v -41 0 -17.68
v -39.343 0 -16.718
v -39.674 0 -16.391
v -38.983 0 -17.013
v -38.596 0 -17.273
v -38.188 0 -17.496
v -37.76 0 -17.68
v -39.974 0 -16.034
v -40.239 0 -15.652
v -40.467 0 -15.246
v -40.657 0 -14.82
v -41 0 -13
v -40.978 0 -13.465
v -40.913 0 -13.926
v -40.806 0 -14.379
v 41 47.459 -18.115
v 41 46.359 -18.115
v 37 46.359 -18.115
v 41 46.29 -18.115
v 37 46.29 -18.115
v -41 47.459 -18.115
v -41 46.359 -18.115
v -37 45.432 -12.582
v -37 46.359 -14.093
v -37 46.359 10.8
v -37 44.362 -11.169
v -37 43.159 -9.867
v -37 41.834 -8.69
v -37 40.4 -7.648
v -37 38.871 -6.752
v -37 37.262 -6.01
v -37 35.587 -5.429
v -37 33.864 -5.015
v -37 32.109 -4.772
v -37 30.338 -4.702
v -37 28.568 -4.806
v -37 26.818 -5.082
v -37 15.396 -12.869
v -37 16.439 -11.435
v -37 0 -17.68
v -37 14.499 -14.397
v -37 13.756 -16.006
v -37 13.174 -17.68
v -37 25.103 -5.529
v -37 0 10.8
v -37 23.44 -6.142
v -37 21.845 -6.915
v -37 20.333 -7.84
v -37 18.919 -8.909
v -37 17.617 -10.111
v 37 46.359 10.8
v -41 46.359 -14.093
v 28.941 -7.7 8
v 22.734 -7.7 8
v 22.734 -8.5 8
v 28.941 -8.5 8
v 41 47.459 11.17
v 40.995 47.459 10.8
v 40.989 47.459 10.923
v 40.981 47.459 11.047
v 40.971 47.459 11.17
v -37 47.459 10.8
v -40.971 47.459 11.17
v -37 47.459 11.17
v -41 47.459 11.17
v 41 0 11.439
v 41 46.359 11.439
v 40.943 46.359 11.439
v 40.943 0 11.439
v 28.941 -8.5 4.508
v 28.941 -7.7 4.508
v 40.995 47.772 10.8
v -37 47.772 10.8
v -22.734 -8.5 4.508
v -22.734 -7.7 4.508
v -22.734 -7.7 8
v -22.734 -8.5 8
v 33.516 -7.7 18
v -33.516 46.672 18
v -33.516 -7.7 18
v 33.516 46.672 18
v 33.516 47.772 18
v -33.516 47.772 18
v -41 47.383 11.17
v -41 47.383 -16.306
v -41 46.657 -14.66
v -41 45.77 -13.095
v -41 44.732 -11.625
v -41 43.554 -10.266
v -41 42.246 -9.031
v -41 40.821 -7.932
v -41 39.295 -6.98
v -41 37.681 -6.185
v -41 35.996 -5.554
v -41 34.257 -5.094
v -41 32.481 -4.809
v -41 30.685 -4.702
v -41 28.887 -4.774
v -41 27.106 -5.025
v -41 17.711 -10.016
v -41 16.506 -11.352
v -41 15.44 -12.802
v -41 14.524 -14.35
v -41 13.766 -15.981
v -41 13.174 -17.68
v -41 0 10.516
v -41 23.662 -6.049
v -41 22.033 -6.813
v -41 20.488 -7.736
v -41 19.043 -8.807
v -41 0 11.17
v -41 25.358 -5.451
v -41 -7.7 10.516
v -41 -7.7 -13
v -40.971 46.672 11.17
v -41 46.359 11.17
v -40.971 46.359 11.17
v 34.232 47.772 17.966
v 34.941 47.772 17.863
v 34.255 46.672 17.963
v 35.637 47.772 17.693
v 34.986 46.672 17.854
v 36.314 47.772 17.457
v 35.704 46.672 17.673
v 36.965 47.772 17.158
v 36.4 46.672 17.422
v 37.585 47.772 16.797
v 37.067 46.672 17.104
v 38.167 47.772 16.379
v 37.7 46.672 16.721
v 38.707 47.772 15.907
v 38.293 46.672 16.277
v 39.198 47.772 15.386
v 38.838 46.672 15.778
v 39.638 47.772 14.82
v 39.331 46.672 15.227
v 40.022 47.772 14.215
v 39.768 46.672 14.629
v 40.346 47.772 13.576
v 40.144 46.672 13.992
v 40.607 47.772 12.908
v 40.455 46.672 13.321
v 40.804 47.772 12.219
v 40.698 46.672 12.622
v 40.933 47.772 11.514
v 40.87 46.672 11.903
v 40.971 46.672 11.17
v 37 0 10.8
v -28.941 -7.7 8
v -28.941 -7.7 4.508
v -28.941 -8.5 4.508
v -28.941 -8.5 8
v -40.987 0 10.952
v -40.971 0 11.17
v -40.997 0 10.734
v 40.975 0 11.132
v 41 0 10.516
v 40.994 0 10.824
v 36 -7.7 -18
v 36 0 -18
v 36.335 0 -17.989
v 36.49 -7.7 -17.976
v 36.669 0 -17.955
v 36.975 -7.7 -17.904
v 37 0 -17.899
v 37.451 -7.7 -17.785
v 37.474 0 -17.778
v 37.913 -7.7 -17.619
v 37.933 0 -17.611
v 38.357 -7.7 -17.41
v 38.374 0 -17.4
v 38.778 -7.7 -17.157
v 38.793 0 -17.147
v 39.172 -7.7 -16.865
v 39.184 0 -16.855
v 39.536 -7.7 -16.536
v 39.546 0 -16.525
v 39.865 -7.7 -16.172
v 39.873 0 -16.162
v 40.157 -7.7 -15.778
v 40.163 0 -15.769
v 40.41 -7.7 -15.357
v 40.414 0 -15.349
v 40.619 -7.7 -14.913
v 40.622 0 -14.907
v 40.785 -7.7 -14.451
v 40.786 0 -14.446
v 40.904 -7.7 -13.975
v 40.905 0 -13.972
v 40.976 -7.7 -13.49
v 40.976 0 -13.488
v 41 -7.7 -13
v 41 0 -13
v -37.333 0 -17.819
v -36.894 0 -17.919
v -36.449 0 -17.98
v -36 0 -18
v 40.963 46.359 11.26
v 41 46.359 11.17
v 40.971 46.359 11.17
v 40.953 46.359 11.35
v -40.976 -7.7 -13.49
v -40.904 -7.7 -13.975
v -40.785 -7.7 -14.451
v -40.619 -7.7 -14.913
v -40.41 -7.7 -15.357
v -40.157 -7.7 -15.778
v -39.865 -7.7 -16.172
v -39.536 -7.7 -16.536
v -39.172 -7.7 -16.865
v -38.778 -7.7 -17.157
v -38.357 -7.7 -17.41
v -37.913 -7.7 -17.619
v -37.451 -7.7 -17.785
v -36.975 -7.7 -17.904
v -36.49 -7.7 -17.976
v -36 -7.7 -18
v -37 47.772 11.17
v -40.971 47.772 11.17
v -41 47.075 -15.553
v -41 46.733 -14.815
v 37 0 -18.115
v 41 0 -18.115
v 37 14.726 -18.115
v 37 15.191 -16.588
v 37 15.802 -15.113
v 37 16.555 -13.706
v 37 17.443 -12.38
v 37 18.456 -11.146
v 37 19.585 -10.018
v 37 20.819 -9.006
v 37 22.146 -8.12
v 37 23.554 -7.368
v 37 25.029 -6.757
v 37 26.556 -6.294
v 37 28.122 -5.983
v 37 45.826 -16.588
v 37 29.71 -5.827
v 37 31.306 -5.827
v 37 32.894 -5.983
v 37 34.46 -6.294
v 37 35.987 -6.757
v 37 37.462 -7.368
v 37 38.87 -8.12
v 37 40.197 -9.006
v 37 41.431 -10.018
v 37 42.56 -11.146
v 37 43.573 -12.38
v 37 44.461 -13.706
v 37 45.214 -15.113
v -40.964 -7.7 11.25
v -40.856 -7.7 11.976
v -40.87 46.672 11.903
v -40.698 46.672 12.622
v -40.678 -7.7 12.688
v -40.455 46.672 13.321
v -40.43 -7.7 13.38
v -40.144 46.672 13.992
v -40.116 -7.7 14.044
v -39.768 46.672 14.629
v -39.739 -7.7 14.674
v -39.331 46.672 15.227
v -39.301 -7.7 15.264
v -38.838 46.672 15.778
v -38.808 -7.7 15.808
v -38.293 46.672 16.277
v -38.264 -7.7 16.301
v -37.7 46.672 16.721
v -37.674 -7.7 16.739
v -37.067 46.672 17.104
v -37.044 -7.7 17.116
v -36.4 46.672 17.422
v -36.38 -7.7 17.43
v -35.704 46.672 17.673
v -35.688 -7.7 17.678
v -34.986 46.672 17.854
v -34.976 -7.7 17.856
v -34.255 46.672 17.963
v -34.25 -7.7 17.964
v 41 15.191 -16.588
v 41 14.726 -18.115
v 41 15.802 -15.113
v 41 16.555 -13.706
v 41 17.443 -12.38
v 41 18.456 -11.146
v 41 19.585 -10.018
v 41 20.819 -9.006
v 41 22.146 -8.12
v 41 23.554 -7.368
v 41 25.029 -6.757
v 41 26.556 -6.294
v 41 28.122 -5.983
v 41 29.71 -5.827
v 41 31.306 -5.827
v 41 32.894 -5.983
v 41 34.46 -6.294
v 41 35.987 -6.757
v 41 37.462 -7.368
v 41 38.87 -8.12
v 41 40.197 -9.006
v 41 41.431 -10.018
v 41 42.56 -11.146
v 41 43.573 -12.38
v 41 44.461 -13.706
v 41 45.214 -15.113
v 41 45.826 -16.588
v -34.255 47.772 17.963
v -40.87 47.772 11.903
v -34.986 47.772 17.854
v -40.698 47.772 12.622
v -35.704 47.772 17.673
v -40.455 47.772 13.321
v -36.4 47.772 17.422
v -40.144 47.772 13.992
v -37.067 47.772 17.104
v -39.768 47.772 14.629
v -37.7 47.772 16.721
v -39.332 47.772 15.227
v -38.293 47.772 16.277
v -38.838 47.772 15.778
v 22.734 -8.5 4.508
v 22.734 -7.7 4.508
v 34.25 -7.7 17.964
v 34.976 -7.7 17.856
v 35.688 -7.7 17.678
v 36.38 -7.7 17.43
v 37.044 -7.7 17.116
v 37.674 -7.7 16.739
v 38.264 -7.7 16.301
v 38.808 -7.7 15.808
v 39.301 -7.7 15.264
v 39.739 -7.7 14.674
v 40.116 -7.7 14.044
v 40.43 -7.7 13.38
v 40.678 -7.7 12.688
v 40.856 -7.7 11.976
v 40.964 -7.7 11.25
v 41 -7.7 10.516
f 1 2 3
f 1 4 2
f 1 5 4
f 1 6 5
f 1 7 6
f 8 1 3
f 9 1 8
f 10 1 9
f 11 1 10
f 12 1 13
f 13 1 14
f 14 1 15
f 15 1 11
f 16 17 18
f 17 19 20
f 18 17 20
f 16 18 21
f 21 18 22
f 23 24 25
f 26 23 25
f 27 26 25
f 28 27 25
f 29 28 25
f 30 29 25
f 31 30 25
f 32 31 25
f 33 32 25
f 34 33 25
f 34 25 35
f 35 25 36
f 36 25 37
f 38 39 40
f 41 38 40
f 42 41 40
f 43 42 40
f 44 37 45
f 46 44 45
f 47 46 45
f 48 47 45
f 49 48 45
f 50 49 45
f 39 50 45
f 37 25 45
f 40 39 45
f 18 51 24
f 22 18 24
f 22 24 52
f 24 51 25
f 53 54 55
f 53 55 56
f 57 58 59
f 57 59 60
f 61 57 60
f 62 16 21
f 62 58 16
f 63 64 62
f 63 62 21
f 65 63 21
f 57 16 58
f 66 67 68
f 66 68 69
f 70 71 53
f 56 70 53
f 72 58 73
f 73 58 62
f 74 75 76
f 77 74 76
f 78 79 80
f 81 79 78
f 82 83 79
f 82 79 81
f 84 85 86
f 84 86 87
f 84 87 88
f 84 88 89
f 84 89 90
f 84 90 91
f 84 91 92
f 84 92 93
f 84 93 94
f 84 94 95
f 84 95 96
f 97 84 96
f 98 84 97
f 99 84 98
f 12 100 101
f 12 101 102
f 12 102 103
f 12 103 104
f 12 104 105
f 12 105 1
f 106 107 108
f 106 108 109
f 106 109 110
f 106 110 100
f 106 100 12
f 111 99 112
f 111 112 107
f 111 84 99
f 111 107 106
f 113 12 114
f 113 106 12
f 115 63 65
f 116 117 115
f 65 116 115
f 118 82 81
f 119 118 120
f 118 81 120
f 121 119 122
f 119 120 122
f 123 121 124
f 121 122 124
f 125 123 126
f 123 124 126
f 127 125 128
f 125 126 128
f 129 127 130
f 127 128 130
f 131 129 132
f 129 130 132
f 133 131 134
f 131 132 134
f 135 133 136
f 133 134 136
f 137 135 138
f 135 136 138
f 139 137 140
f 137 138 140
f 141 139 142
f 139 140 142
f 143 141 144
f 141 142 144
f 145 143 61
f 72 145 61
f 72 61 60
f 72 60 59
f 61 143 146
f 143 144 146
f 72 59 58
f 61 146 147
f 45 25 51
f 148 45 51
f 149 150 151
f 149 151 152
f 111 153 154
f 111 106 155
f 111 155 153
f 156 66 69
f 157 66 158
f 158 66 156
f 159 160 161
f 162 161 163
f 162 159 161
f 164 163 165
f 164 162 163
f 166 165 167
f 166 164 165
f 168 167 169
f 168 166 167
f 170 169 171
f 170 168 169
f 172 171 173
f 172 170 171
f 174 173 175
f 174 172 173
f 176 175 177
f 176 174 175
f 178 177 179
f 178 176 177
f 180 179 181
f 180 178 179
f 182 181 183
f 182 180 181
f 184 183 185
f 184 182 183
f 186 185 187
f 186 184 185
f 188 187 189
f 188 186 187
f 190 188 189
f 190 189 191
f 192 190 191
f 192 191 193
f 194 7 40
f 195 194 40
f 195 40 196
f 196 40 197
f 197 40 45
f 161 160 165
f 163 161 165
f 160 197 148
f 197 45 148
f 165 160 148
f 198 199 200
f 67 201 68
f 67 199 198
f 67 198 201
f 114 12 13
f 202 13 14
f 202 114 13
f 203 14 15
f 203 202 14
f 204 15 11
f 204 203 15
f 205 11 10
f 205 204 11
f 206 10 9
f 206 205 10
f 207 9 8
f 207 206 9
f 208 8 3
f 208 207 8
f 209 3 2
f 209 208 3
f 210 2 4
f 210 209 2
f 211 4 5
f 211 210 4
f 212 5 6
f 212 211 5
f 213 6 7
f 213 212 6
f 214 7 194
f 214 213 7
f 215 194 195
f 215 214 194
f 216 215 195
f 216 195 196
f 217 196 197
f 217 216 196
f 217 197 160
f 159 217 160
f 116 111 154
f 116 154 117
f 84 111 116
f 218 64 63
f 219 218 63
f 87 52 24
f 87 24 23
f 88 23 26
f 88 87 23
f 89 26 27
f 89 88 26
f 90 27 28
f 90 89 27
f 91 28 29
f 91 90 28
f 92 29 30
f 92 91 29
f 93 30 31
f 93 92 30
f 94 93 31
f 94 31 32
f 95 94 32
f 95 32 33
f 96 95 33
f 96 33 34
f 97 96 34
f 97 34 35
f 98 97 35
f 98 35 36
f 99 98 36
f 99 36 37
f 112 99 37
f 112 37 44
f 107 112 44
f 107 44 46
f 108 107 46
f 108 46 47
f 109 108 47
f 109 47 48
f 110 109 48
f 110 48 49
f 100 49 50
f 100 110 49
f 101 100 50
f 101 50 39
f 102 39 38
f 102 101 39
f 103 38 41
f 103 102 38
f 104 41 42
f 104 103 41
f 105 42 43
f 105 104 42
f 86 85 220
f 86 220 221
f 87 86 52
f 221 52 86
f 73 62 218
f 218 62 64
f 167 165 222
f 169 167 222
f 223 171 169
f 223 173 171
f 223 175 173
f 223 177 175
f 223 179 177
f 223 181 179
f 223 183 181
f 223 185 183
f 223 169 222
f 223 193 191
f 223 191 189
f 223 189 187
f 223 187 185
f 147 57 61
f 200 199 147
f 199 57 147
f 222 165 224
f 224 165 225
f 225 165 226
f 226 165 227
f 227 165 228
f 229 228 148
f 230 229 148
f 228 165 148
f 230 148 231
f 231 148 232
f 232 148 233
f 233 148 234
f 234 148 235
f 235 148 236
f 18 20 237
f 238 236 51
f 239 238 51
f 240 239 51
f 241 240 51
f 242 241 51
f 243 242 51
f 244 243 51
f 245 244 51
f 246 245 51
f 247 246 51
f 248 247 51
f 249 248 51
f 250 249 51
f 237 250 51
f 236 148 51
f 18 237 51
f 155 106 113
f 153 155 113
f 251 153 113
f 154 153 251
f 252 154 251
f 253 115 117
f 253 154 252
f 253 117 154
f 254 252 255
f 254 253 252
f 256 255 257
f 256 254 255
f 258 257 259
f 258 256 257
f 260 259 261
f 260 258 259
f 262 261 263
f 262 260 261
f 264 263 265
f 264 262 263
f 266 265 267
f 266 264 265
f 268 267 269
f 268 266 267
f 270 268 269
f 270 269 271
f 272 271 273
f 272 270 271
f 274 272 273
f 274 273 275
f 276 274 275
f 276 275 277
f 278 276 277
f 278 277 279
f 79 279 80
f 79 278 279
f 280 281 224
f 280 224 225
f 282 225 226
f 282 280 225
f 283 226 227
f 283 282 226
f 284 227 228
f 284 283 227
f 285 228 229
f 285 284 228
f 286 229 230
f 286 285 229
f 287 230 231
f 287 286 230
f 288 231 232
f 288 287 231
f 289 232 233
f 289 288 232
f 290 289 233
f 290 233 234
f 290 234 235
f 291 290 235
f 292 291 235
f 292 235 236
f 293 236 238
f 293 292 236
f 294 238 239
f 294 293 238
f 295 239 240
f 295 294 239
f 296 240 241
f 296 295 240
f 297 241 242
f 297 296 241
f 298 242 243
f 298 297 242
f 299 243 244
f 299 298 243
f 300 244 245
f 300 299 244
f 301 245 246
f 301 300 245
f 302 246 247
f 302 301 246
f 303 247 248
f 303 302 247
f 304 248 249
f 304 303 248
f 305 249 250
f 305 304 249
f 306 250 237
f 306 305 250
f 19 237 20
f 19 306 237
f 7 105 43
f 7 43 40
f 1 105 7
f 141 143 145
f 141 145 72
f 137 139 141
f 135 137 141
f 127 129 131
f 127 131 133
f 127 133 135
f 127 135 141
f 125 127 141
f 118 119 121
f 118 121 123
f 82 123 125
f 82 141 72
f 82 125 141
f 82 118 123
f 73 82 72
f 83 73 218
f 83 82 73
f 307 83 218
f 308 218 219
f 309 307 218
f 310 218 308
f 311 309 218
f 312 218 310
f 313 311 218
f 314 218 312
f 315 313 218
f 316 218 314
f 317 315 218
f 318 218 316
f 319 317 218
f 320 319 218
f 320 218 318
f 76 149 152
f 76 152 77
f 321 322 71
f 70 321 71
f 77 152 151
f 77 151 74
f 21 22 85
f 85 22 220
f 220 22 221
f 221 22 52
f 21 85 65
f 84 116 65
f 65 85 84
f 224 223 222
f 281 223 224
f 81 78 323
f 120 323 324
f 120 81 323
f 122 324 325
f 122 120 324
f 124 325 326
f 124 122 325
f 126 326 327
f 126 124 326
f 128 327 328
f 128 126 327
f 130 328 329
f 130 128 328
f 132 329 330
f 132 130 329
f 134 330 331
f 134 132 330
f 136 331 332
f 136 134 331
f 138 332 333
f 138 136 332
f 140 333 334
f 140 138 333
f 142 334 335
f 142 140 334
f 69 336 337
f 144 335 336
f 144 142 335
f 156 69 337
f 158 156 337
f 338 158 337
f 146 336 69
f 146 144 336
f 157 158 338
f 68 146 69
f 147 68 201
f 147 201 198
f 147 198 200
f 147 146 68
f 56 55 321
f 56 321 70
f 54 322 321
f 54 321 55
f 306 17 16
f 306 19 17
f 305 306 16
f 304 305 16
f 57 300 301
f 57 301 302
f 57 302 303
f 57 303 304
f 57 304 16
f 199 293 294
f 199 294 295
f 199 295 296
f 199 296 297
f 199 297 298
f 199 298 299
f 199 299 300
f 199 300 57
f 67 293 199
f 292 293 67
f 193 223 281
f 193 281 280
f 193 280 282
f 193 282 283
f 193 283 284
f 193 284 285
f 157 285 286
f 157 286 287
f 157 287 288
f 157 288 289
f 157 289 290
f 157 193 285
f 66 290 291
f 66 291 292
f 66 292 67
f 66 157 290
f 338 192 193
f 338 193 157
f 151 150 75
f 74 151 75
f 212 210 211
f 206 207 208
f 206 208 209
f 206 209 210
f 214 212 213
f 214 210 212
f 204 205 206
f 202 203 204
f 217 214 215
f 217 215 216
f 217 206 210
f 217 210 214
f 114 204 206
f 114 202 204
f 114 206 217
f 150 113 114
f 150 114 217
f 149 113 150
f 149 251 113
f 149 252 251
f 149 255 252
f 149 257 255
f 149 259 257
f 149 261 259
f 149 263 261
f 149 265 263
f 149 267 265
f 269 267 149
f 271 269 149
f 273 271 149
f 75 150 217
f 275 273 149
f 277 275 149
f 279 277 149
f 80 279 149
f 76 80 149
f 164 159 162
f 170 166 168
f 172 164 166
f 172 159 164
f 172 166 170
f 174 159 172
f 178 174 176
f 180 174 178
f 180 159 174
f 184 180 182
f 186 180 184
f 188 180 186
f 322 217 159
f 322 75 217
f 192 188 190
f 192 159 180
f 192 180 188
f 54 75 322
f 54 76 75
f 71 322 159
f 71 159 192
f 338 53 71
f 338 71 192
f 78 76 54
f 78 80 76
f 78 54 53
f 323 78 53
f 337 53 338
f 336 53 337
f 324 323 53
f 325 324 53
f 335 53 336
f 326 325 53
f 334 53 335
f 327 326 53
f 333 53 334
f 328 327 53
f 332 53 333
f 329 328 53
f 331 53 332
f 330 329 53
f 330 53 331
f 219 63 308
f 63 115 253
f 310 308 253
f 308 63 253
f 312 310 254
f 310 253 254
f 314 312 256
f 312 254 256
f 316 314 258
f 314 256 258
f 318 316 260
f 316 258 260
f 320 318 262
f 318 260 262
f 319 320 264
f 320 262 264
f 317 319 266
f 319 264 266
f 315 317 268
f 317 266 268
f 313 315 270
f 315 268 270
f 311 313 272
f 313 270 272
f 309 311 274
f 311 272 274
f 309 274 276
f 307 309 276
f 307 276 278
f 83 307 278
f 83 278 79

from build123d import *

# Parameters (mm, degrees)
F0_W      = 82
F0_H      = 36
F1_DEPTH  = 7.7
F2_W      = 82
F2_H      = 54
F3_DEPTH  = 7.2
F4_R      = 7.4840620434
F5_R      = 5
F6_W      = 6.2068961561
F6_H      = 3.4913793206
F7_DEPTH  = 0.8
F10_DEPTH = 4
F11_DEPTH = 4
F12_W     = 81.9998856485
F12_H     = 29.2846155894
F13_DEPTH = 1.1


with BuildPart() as f1:
    # F0 (on Front) → F1 (new body)
    with BuildSketch(Plane.XZ):
        Rectangle(F0_W, F0_H)
    extrude(amount=F1_DEPTH)

    # F2 (on face) → F3 (join)
    with BuildSketch(Plane.XY.offset(18)):
        with Locations((0, 19.672181885)):
            Rectangle(F2_W, F2_H)
    extrude(amount=-F3_DEPTH)

    # F4
    f4_edges = [f1.edges().sort_by_distance(p)[0] for p in [
        (41, 19.486091, 18),
        (-41, 19.486091, 18),
    ]]
    fillet(f4_edges, radius=F4_R)

    # F5
    f5_edges = [f1.edges().sort_by_distance(p)[0] for p in [
        (-41, -3.85, -18),
        (41, -3.85, -18),
    ]]
    fillet(f5_edges, radius=F5_R)

    # F6 (on face) → F7 (join)
    with BuildSketch(Plane.XZ.offset(7.7)):
        with Locations((-25.83758533, 6.2539605424)):
            Rectangle(F6_W, F6_H)
        with Locations((25.83758533, 6.2539605424)):
            Rectangle(F6_W, F6_H)
    extrude(amount=F7_DEPTH)

    # F8 (on face) → F10 (join)
    with BuildSketch(Plane.YZ.offset(41)):
        with BuildLine():
            Line((46.3586388528, 11.4392106599), (0, 11.4392106599))
            Line((0, 11.4392106599), (0, 10.5159379566))
            Line((0, 10.5159379566), (0, -13))
            Line((0, -13), (0, -18.1146790814))
            Line((0, -18.1146790814), (14.7262415299, -18.1146790814))
            ThreePointArc((14.7262415299, -18.1146790814), (30.5080702528, -5.8071597095), (46.2898989758, -18.1146790814))
            Line((46.2898989758, -18.1146790814), (46.3586388528, -18.1146790814))
            Line((46.3586388528, -18.1146790814), (46.3586388528, 11.4392106599))
        make_face()
    extrude(amount=-F10_DEPTH)

    # F9 (on face) → F11 (join)
    with BuildSketch(Plane(origin=(-41, 0, 0), x_dir=(0, -1, 0), z_dir=(-1, 0, 0))):
        with BuildLine():
            Line((0, 10.5159379566), (0, 11.1698398332))
            Line((0, 11.1698398332), (-47.3828552663, 11.1698398332))
            Line((-47.3828552663, 11.1698398332), (-47.3828552663, -16.3062599394))
            ThreePointArc((-47.3828552663, -16.3062599394), (-29.7853048283, -4.7156749244), (-13.1738176833, -17.6800081985))
            Line((-13.1738176833, -17.6800081985), (0, -17.6800081985))
            Line((0, -17.6800081985), (0, -13))
            Line((0, -13), (0, 10.5159379566))
        make_face()
    extrude(amount=-F11_DEPTH)

    # F12 (on face) + F3_face2 (on face) → F13 (join)
    with BuildSketch(Plane(origin=(0, 46.3586388528, 0), x_dir=(-1, 0, 0), z_dir=(0, 1, 0))):
        with Locations((-5.71758e-05, -3.4723712868)):
            Rectangle(F12_W, F12_H)
    with BuildSketch(Plane(origin=(0.1017201648, 46.672181885, 14.3268391262), x_dir=(-1, 0, 0), z_dir=(0, 1, 0))):
        with BuildLine():
            Line((33.6176581214, 3.6731608738), (-33.4142177919, 3.6731608738))
            ThreePointArc((-33.4142177919, 3.6731608738), (-38.6048462082, 1.5806256376), (-40.8928870201, -3.5268391262))
            Line((-40.8928870201, -3.5268391262), (37.1017201648, -3.5268391262))
            Line((37.1017201648, -3.5268391262), (37.1017201648, -3.156999293))
            Line((37.1017201648, -3.156999293), (41.0730988867, -3.156999293))
            ThreePointArc((41.0730988867, -3.156999293), (38.67321657, 1.7074784333), (33.6176581214, 3.6731608738))
        make_face()
    extrude(amount=F13_DEPTH)


solid = f1.part
